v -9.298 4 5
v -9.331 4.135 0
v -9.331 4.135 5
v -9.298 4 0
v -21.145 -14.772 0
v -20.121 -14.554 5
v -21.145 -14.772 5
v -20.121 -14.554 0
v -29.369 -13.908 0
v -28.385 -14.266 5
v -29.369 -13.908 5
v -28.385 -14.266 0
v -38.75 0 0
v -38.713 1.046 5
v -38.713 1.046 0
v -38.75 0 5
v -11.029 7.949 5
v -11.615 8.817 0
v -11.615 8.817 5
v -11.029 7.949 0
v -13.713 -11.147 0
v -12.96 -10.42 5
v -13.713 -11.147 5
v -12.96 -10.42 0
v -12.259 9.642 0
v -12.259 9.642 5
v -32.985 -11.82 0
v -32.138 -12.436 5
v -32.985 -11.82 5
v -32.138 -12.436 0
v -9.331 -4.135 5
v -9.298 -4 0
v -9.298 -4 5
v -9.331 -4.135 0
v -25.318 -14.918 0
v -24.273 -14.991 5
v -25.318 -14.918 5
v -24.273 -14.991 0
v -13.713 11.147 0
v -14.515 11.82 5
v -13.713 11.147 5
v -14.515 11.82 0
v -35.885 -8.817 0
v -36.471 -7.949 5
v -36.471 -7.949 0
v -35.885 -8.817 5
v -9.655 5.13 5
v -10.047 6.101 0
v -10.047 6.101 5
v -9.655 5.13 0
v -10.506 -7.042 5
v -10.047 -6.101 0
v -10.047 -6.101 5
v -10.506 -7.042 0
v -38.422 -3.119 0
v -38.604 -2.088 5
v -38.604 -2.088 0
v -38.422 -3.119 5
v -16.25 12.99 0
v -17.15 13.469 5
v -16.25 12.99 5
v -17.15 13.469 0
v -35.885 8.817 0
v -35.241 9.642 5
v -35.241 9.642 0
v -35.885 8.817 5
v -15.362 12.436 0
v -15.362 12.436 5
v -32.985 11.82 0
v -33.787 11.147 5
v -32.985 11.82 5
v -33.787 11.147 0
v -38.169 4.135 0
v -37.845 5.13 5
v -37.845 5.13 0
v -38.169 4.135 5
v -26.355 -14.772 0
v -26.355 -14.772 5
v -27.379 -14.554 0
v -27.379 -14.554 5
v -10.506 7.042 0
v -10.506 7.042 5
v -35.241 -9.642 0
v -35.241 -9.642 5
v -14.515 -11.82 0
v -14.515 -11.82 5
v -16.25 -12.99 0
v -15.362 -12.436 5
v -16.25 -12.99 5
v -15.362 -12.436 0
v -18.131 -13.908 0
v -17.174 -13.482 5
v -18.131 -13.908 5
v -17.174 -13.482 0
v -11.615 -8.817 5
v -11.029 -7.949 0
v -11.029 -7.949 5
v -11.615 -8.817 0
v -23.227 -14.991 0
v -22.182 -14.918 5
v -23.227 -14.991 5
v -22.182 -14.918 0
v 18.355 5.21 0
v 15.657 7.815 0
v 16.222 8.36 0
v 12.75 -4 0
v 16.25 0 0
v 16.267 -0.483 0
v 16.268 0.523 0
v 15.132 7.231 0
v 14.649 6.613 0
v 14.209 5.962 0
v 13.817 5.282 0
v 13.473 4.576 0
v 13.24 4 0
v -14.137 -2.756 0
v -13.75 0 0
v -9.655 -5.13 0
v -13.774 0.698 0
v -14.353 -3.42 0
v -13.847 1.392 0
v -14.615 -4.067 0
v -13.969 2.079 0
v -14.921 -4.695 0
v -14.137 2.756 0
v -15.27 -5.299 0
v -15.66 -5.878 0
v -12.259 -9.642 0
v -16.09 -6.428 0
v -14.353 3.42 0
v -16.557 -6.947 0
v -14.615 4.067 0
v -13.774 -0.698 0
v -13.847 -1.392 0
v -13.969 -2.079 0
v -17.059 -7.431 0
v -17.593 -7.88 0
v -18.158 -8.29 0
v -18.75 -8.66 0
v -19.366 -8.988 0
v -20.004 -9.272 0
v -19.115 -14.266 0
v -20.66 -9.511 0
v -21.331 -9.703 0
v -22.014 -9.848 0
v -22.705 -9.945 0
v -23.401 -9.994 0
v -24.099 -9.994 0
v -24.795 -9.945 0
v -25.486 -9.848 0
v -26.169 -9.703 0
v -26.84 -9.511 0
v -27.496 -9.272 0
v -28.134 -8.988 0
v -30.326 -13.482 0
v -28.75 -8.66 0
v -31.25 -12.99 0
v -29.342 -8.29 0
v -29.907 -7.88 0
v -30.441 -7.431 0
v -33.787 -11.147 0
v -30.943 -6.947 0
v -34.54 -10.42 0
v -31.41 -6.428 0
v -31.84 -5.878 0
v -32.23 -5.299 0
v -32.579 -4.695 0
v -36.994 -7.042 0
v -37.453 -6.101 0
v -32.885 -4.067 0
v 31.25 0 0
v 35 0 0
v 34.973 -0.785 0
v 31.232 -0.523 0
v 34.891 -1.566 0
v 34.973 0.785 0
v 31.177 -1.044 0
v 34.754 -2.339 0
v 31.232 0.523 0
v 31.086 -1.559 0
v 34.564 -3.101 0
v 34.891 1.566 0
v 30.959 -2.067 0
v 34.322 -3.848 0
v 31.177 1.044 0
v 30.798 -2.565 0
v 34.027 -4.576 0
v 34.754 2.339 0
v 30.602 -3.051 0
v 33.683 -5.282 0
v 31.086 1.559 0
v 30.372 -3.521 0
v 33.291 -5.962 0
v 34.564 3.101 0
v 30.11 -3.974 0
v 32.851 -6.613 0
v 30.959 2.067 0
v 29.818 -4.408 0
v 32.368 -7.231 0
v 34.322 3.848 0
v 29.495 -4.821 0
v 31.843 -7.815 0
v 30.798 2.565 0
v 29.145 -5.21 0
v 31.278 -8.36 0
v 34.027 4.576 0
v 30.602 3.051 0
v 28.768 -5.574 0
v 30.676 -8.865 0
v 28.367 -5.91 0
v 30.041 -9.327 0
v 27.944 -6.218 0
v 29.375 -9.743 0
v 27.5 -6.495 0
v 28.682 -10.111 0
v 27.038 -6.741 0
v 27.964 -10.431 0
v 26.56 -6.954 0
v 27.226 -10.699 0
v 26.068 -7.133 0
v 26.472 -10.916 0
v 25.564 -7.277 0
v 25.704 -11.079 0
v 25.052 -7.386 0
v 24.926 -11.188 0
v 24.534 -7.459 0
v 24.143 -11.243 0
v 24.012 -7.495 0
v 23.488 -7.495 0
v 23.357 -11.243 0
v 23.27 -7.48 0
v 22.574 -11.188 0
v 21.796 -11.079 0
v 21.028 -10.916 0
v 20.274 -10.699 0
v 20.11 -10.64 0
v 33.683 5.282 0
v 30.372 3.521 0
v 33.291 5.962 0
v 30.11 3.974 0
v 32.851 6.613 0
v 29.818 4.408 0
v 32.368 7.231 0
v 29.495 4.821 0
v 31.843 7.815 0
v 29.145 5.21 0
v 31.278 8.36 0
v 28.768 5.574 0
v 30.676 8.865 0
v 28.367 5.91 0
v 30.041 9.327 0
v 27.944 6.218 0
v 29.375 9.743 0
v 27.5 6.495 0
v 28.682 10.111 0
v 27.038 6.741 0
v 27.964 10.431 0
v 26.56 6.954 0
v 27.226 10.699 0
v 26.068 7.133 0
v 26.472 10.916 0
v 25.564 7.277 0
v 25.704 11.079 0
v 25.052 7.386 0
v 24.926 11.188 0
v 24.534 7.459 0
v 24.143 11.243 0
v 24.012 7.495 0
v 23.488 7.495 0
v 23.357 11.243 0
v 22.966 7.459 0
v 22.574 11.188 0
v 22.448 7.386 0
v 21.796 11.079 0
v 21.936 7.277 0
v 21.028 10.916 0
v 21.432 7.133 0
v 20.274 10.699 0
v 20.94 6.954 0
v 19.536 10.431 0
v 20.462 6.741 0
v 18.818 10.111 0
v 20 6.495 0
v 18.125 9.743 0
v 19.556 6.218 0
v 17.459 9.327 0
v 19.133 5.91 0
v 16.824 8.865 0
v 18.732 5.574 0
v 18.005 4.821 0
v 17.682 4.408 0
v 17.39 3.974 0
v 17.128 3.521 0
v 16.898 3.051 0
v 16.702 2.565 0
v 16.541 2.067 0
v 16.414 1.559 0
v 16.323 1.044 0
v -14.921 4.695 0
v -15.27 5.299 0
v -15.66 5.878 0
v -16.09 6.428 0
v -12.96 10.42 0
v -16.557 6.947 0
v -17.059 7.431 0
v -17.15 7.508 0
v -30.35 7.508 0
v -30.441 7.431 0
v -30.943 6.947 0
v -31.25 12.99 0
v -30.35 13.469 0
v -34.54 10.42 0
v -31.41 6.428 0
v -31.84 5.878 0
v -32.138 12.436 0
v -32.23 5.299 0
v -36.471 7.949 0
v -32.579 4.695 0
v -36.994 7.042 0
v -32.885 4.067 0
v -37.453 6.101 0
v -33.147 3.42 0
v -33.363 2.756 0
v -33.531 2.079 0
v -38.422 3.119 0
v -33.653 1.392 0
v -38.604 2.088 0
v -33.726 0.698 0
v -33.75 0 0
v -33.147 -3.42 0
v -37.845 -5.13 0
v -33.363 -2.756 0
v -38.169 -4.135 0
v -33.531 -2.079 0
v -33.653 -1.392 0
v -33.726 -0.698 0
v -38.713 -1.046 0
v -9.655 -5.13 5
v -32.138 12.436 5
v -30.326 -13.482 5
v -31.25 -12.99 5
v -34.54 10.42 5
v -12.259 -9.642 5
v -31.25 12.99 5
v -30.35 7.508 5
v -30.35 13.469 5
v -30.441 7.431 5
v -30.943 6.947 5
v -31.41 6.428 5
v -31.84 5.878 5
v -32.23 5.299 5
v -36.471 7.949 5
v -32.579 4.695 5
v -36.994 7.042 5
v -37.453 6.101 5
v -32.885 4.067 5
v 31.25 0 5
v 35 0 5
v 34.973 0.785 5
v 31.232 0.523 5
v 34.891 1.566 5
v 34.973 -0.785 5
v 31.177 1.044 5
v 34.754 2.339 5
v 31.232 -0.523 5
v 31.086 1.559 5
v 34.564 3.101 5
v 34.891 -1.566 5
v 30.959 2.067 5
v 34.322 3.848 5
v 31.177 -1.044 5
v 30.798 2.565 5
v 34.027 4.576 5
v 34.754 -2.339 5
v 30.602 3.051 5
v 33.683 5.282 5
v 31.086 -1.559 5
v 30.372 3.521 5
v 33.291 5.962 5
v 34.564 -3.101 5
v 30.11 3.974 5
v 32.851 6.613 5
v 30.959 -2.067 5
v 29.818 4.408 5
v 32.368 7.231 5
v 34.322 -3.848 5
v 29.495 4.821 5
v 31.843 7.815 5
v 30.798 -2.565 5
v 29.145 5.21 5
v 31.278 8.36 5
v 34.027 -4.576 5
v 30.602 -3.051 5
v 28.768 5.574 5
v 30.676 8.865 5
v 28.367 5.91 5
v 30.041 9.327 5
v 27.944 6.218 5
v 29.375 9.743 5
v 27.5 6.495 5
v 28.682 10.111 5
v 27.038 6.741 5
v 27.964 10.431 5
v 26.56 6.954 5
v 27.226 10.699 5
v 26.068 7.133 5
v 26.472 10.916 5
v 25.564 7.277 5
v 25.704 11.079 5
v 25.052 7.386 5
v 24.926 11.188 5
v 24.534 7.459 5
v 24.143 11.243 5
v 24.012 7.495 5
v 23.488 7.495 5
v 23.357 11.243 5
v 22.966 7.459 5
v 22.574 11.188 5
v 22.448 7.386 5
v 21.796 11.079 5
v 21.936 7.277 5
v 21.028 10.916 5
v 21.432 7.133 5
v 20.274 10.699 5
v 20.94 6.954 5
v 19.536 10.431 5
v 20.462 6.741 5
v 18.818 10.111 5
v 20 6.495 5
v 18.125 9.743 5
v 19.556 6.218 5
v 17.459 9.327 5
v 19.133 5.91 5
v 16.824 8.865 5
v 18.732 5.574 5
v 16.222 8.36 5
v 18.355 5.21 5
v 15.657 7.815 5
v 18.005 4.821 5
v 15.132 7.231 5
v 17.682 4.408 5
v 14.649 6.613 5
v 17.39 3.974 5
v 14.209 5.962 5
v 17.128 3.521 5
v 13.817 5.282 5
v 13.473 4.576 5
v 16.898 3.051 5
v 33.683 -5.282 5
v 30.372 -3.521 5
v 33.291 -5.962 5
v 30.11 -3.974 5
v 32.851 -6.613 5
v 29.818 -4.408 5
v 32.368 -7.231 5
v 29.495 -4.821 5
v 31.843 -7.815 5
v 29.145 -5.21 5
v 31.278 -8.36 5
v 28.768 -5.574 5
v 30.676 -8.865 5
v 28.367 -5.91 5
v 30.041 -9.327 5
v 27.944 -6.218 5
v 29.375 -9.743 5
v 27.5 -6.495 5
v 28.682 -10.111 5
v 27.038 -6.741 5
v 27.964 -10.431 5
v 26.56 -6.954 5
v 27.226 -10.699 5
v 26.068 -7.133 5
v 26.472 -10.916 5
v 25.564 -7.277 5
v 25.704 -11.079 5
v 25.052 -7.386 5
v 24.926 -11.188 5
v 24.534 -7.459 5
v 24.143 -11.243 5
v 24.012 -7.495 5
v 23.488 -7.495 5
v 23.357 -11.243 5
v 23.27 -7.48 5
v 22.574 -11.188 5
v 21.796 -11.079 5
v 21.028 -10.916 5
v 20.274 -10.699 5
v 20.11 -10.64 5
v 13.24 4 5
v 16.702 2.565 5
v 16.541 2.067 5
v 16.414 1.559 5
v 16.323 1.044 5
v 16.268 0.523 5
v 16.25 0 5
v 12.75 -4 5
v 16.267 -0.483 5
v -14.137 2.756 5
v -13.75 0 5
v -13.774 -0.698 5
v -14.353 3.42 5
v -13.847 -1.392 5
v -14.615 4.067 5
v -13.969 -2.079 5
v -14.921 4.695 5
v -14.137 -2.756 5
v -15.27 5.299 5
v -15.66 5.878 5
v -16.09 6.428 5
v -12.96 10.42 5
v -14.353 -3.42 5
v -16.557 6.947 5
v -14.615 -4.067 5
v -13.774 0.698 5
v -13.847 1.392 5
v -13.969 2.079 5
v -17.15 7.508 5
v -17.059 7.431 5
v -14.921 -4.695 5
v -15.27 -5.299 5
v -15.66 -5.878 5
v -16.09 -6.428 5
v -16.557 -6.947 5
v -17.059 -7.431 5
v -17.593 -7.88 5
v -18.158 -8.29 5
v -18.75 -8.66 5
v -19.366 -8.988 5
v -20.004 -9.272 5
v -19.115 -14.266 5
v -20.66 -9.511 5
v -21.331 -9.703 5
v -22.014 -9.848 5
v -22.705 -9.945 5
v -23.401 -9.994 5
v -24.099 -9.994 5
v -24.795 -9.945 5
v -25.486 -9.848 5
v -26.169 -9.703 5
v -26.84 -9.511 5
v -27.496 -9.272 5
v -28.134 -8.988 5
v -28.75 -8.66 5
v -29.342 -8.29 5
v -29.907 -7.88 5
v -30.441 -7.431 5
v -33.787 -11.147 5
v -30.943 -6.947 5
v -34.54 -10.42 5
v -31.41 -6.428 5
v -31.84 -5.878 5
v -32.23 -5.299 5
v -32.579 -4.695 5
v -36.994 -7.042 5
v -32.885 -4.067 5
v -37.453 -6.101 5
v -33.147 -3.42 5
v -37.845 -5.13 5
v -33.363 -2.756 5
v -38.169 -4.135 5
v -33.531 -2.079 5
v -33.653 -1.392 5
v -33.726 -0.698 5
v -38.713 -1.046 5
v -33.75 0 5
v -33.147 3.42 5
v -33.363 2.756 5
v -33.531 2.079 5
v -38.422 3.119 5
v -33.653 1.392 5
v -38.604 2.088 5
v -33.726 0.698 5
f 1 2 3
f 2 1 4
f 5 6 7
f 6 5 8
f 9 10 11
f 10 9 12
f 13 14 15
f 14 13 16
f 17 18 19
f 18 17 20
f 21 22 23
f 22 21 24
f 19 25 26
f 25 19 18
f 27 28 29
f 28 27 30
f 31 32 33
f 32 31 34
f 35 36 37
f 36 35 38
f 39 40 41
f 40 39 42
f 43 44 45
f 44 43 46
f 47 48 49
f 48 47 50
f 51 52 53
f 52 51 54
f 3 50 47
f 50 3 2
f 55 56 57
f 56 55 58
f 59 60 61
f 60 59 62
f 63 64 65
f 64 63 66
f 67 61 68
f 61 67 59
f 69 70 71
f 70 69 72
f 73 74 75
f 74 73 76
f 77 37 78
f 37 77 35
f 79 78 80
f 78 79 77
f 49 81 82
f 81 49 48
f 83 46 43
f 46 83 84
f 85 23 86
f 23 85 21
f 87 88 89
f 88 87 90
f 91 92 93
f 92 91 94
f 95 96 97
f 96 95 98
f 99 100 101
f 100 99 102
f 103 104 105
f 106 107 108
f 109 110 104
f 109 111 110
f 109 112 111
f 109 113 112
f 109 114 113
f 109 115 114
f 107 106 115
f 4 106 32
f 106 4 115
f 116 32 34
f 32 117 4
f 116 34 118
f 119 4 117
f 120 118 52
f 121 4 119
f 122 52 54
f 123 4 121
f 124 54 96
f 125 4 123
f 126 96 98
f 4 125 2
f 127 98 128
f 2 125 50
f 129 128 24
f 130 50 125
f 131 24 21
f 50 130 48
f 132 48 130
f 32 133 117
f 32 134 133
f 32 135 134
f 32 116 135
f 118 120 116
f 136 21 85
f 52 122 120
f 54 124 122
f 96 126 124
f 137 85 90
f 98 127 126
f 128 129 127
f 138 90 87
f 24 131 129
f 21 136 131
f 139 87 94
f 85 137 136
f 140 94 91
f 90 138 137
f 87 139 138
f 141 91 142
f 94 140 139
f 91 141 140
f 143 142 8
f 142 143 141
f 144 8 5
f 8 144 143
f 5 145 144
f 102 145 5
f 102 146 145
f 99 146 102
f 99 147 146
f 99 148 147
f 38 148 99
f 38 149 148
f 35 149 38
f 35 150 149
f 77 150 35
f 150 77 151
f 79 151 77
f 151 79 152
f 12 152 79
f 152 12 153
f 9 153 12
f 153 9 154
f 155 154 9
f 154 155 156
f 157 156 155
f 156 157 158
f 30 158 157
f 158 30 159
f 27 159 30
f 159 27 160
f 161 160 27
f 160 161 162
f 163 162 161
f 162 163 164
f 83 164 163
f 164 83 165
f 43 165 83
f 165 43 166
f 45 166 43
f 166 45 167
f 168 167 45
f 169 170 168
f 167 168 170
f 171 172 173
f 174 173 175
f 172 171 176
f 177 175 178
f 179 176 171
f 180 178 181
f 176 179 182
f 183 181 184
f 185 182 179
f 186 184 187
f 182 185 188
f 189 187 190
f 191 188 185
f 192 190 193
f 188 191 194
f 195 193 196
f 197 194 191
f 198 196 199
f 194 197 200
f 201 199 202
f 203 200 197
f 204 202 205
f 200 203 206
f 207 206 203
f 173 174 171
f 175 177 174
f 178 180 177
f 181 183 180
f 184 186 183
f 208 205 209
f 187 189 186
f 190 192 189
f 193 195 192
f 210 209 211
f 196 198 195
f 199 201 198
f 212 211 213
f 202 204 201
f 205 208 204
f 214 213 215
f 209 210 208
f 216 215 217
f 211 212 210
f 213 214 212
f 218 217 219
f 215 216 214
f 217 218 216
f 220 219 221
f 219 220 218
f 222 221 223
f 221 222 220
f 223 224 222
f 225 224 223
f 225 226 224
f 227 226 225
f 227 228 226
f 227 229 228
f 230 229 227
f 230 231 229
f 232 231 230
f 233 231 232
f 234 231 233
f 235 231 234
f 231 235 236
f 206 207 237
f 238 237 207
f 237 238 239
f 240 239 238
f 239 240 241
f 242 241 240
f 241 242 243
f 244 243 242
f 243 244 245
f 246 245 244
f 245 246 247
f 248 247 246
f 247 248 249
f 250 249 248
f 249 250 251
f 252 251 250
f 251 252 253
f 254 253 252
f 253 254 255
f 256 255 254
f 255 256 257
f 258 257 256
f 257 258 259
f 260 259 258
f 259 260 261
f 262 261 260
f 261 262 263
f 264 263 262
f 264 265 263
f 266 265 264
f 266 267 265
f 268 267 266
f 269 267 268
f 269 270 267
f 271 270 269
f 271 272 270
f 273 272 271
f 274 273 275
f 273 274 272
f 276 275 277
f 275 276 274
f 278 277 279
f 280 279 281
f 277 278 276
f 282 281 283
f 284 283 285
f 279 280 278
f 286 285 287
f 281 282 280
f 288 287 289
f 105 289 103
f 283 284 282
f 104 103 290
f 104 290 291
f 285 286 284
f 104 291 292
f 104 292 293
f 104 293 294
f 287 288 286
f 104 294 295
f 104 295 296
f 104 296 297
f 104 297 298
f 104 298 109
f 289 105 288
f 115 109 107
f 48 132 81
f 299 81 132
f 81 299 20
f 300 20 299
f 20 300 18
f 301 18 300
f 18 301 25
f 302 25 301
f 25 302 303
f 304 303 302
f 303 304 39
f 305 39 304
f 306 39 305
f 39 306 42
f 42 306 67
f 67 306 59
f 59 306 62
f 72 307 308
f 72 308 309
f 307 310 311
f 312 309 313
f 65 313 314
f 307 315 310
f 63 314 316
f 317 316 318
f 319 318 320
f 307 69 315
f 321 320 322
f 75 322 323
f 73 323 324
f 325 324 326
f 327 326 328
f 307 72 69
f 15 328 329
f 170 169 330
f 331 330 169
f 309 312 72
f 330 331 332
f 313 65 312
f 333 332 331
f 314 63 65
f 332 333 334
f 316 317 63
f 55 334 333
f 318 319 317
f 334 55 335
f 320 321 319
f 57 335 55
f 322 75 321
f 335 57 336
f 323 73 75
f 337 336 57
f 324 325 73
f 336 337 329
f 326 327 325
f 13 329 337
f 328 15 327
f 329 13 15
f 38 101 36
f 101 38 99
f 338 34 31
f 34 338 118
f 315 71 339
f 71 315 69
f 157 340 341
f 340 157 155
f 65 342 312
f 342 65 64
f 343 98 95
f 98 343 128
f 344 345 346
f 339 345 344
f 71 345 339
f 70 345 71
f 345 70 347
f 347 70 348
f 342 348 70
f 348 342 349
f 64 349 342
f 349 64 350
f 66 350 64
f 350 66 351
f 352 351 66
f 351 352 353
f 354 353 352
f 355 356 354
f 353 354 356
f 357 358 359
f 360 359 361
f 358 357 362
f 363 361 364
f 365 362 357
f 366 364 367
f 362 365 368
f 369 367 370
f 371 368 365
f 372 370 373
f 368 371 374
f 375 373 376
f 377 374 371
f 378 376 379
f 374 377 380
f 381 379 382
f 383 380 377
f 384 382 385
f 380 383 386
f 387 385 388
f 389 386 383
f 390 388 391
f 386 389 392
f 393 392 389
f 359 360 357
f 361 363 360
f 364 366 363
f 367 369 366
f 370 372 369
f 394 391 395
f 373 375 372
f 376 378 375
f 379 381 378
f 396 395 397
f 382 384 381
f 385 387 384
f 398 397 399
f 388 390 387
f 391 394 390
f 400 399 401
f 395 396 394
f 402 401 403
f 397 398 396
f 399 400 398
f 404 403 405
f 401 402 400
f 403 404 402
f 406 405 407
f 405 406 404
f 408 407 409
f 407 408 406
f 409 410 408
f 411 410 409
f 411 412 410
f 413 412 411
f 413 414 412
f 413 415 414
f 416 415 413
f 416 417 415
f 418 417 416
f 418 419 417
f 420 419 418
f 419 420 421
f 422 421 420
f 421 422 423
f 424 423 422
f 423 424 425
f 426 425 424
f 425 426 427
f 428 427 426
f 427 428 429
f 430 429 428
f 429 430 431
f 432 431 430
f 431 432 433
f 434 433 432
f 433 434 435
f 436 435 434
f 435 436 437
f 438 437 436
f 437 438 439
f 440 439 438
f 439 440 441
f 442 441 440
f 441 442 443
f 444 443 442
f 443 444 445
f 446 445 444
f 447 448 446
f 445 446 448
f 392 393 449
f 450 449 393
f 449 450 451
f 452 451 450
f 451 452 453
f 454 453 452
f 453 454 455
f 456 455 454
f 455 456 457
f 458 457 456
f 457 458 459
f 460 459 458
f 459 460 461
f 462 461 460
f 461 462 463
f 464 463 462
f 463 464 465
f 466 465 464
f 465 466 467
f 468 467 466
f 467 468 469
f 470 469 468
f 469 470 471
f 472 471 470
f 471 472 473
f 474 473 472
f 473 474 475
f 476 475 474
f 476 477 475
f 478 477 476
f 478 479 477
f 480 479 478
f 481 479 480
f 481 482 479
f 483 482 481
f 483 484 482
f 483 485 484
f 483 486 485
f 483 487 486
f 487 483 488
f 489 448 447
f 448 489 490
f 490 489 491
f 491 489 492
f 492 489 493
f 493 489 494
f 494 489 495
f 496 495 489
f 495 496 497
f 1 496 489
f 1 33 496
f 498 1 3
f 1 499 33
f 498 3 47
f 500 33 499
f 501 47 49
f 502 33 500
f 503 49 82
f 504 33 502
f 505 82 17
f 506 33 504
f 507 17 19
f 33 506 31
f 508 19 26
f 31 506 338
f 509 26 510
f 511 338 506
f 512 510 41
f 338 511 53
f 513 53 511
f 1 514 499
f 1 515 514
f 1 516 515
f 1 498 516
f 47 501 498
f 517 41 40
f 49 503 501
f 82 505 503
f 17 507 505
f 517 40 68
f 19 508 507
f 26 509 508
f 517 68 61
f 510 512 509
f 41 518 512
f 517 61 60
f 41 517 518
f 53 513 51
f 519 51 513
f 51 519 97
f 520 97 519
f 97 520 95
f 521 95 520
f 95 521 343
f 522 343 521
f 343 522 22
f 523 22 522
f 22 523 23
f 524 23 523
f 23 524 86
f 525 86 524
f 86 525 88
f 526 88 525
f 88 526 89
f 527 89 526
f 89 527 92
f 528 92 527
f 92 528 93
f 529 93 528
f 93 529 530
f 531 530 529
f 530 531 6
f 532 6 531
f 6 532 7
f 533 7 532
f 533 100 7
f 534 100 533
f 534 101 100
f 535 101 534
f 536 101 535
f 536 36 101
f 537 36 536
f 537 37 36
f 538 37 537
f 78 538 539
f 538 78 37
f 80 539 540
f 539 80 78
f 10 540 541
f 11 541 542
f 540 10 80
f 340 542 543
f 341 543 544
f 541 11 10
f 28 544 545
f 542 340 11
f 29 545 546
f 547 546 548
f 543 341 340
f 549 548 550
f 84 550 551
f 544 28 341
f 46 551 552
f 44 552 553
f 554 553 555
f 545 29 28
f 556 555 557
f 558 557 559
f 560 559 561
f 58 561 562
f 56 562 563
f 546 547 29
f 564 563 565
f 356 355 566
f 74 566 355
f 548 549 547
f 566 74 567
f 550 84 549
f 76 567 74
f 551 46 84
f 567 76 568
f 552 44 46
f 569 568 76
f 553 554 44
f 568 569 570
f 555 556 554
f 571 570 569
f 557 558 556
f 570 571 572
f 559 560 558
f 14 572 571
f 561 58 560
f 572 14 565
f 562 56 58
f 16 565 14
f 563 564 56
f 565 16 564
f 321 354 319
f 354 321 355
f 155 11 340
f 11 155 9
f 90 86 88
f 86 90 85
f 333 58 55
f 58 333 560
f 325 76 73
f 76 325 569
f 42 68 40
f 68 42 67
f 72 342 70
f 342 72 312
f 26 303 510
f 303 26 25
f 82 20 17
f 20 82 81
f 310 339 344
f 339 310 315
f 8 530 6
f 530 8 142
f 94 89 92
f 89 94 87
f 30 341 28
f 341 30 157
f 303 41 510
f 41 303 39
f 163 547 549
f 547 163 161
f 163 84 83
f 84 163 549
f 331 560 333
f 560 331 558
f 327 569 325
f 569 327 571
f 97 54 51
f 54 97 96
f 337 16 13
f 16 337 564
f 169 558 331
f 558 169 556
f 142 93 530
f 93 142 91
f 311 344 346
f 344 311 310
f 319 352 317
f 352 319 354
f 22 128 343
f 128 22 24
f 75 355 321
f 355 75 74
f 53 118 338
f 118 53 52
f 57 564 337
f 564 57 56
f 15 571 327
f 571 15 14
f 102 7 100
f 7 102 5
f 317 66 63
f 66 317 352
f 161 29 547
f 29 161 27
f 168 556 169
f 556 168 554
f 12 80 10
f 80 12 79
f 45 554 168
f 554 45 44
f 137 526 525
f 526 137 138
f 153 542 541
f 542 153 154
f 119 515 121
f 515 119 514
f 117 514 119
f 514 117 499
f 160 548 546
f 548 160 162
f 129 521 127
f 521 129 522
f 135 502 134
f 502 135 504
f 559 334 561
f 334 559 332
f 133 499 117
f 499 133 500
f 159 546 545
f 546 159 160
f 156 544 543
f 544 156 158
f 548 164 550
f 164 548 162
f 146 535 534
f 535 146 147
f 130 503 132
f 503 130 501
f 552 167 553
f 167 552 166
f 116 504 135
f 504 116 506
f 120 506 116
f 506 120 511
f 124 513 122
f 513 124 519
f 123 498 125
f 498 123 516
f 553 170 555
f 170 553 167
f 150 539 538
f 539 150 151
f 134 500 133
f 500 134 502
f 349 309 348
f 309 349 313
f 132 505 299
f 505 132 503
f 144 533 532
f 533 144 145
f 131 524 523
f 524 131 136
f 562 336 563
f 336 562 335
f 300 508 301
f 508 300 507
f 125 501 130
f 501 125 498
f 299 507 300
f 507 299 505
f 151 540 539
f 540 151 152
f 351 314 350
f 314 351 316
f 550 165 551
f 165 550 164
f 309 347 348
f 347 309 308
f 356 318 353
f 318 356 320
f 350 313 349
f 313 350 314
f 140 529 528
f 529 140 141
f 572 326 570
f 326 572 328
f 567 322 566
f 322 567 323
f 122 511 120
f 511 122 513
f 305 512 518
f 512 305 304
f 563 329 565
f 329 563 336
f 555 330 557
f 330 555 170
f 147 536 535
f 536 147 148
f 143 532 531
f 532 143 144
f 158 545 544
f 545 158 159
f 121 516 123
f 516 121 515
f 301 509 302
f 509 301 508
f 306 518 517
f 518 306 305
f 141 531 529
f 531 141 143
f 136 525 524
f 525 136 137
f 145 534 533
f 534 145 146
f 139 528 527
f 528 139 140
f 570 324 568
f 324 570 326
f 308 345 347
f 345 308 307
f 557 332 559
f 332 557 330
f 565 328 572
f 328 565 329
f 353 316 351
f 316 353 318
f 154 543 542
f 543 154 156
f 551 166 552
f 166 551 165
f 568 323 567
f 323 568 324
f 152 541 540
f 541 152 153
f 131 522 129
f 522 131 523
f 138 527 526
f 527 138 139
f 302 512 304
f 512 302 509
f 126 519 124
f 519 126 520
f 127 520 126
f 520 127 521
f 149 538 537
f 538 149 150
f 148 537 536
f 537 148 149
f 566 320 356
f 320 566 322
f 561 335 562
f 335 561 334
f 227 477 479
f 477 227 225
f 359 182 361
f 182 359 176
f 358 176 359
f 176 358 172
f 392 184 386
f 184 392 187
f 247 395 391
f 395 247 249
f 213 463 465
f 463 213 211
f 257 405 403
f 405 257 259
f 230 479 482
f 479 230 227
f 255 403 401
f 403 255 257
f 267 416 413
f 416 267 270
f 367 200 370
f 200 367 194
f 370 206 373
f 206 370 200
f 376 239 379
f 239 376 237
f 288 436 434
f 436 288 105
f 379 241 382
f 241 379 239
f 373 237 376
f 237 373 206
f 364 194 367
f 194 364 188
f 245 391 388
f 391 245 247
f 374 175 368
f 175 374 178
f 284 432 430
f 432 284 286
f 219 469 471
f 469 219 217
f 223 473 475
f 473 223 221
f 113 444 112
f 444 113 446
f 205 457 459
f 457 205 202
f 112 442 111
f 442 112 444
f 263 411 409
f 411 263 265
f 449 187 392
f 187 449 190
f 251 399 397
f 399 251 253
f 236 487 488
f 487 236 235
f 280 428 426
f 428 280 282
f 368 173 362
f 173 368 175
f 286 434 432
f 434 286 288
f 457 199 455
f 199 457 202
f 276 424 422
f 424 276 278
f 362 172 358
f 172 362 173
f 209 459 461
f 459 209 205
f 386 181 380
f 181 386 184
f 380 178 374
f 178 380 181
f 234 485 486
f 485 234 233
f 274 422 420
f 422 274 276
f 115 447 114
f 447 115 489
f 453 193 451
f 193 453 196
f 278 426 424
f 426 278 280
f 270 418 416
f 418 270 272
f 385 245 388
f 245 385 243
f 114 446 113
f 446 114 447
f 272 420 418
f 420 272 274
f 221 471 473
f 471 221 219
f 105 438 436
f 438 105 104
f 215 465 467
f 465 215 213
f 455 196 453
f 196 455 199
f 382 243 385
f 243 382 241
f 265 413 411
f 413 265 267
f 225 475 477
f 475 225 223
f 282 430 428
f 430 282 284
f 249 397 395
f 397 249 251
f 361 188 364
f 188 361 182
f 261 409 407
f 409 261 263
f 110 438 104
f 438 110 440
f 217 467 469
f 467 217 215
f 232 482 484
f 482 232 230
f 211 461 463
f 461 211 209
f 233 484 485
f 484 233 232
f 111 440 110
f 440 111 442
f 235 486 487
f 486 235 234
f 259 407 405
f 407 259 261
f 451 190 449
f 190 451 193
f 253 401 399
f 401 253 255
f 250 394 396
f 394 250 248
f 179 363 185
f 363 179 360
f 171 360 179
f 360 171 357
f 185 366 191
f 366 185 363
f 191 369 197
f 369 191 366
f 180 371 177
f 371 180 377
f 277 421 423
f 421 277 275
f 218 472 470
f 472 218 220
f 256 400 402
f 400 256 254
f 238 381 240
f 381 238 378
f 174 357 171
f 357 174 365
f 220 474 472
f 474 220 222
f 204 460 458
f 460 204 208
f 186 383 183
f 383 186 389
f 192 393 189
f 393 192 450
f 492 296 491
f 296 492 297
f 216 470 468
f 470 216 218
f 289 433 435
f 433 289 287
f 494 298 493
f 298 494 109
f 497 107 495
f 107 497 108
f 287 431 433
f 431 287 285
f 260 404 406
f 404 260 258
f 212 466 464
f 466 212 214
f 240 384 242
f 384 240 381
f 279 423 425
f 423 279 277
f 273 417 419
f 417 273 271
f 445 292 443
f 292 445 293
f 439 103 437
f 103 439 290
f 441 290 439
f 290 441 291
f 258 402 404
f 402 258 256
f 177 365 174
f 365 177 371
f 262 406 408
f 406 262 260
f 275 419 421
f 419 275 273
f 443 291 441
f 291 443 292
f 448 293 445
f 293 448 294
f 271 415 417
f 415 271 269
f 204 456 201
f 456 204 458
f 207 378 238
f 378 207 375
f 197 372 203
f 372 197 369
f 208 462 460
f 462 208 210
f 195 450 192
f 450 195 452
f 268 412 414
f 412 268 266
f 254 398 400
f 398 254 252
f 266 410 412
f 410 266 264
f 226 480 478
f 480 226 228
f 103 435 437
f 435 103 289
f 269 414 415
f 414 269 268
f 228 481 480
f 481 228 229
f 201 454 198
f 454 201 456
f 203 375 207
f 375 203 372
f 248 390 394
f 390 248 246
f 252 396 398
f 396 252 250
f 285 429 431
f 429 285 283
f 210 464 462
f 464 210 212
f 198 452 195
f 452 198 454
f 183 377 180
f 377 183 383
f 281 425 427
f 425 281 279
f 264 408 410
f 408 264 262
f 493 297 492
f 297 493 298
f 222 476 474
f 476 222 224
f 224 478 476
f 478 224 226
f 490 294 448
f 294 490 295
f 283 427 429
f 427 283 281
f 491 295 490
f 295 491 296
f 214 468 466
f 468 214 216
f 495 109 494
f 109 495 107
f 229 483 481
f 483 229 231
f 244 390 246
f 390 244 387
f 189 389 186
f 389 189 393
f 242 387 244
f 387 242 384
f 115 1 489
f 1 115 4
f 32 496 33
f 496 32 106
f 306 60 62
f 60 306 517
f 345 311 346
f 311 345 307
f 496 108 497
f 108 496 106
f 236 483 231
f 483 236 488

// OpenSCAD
// [FL_INDEX: keywords="openscad, 3d_parametric, Highly_customizable_S-Hook, csg_solid" | COT="Parametric OpenSCAD design from 3DCodeverse"]
// Title: Highly customizable S-Hook

// A highly customizable S-Hook
// http://6brueder.wordpress.com
// October 2013
// Public Domain - Creative Commons CC0 1.0

// Inner diameter of the first ring
diameter_1              = 20;	// [1:200]

// Inner diameter of the second ring
diameter_2              = 15;	// [1:200]

// Distance between both rings
distance_type           = 1;	// [1:Manual distance,2:Closest distance]

// Only be used when "Distance Type = Manual distance"
manual_distance         = 30;	// [1:300]

// Strength of the rings, % in relation to the larger diameter
ring_strength           = 25;	// [1:100]

shape                   = 1;	// [1:S-Shape,2:3-Shape]

/* [Vents] */
vent_1_rotation         = 0;	// [-90:45]
vent_2_rotation         = 45;	// [-90:45]

// Size of the first vent in % in relation to the larger diameter
vent_1_strength         = 66;	// [1:100] 

// Size of the second vent in % in relation to the smaller diameter
vent_2_strength         = 66;	// [1:100]


// Calculations
large                   = diameter_1 > diameter_2 ? diameter_1 : diameter_2;
small                   = diameter_1 > diameter_2 ? diameter_2 : diameter_1;
ring_strength_normalized= ring_strength / 100;
global_height           = large * ring_strength_normalized;


// Distance
real_manual_distance    = manual_distance + diameter_1 / 2 + diameter_2 / 2;
closest_distance			= large / 2 + small / 2 + global_height;
distance_normalized     = distance_type == 1 ? real_manual_distance : closest_distance;


// Vents
vent_size_1             = large * (vent_1_strength / 100);
vent_size_2             = small * (vent_2_strength / 100);

shape_normalized        = shape;

vent_2_rotation_calc    = (shape_normalized == 1) ? (-vent_2_rotation + 180) : vent_2_rotation;


// Ring module
module ring(inner_diameter) {
    ring_size = inner_diameter * ring_strength_normalized;

    difference() {
        cylinder(h = global_height, r = (inner_diameter/2) + ring_size);
        translate([0,0,-0.1]) cylinder(h = global_height + 0.2, r = (inner_diameter/2));
    }
}


translate([-distance_normalized/2,0,0]) {
	difference() {
	    union() {
	        // First ring
	        ring(large);
	        
	        // Second ring
	        translate ([distance_normalized,0,0]) ring(small);
	        
	        
	        difference() {
	            // Connection bar
	            translate([0,-global_height * 1.6/2,0]) cube([distance_normalized, global_height * 1.6, global_height]);
	            
	            // The holes
	            union() {
	                translate([0,0,-0.1]) cylinder(h = global_height + 0.2, r = (large/2));
	                translate([distance_normalized,0,-0.1]) cylinder(h = global_height + 0.2, r = (small/2));
	            }
	        }
	    }
	    
	    // Vents
	    union() {
	         rotate(-vent_1_rotation) translate([-vent_size_1/2,0,-0.1]) cube([vent_size_1, large/2 + global_height + 1, global_height + 0.2]);
	
	        translate ([distance_normalized,0,0]) {
	            rotate(vent_2_rotation_calc) translate([-vent_size_2/2,0,-0.1]) cube([vent_size_2, small/2 + global_height + 1, global_height + 0.2]);
	        }
	    }
	}
}

//preview[view:east,tilt:top]
$fn = 90;
